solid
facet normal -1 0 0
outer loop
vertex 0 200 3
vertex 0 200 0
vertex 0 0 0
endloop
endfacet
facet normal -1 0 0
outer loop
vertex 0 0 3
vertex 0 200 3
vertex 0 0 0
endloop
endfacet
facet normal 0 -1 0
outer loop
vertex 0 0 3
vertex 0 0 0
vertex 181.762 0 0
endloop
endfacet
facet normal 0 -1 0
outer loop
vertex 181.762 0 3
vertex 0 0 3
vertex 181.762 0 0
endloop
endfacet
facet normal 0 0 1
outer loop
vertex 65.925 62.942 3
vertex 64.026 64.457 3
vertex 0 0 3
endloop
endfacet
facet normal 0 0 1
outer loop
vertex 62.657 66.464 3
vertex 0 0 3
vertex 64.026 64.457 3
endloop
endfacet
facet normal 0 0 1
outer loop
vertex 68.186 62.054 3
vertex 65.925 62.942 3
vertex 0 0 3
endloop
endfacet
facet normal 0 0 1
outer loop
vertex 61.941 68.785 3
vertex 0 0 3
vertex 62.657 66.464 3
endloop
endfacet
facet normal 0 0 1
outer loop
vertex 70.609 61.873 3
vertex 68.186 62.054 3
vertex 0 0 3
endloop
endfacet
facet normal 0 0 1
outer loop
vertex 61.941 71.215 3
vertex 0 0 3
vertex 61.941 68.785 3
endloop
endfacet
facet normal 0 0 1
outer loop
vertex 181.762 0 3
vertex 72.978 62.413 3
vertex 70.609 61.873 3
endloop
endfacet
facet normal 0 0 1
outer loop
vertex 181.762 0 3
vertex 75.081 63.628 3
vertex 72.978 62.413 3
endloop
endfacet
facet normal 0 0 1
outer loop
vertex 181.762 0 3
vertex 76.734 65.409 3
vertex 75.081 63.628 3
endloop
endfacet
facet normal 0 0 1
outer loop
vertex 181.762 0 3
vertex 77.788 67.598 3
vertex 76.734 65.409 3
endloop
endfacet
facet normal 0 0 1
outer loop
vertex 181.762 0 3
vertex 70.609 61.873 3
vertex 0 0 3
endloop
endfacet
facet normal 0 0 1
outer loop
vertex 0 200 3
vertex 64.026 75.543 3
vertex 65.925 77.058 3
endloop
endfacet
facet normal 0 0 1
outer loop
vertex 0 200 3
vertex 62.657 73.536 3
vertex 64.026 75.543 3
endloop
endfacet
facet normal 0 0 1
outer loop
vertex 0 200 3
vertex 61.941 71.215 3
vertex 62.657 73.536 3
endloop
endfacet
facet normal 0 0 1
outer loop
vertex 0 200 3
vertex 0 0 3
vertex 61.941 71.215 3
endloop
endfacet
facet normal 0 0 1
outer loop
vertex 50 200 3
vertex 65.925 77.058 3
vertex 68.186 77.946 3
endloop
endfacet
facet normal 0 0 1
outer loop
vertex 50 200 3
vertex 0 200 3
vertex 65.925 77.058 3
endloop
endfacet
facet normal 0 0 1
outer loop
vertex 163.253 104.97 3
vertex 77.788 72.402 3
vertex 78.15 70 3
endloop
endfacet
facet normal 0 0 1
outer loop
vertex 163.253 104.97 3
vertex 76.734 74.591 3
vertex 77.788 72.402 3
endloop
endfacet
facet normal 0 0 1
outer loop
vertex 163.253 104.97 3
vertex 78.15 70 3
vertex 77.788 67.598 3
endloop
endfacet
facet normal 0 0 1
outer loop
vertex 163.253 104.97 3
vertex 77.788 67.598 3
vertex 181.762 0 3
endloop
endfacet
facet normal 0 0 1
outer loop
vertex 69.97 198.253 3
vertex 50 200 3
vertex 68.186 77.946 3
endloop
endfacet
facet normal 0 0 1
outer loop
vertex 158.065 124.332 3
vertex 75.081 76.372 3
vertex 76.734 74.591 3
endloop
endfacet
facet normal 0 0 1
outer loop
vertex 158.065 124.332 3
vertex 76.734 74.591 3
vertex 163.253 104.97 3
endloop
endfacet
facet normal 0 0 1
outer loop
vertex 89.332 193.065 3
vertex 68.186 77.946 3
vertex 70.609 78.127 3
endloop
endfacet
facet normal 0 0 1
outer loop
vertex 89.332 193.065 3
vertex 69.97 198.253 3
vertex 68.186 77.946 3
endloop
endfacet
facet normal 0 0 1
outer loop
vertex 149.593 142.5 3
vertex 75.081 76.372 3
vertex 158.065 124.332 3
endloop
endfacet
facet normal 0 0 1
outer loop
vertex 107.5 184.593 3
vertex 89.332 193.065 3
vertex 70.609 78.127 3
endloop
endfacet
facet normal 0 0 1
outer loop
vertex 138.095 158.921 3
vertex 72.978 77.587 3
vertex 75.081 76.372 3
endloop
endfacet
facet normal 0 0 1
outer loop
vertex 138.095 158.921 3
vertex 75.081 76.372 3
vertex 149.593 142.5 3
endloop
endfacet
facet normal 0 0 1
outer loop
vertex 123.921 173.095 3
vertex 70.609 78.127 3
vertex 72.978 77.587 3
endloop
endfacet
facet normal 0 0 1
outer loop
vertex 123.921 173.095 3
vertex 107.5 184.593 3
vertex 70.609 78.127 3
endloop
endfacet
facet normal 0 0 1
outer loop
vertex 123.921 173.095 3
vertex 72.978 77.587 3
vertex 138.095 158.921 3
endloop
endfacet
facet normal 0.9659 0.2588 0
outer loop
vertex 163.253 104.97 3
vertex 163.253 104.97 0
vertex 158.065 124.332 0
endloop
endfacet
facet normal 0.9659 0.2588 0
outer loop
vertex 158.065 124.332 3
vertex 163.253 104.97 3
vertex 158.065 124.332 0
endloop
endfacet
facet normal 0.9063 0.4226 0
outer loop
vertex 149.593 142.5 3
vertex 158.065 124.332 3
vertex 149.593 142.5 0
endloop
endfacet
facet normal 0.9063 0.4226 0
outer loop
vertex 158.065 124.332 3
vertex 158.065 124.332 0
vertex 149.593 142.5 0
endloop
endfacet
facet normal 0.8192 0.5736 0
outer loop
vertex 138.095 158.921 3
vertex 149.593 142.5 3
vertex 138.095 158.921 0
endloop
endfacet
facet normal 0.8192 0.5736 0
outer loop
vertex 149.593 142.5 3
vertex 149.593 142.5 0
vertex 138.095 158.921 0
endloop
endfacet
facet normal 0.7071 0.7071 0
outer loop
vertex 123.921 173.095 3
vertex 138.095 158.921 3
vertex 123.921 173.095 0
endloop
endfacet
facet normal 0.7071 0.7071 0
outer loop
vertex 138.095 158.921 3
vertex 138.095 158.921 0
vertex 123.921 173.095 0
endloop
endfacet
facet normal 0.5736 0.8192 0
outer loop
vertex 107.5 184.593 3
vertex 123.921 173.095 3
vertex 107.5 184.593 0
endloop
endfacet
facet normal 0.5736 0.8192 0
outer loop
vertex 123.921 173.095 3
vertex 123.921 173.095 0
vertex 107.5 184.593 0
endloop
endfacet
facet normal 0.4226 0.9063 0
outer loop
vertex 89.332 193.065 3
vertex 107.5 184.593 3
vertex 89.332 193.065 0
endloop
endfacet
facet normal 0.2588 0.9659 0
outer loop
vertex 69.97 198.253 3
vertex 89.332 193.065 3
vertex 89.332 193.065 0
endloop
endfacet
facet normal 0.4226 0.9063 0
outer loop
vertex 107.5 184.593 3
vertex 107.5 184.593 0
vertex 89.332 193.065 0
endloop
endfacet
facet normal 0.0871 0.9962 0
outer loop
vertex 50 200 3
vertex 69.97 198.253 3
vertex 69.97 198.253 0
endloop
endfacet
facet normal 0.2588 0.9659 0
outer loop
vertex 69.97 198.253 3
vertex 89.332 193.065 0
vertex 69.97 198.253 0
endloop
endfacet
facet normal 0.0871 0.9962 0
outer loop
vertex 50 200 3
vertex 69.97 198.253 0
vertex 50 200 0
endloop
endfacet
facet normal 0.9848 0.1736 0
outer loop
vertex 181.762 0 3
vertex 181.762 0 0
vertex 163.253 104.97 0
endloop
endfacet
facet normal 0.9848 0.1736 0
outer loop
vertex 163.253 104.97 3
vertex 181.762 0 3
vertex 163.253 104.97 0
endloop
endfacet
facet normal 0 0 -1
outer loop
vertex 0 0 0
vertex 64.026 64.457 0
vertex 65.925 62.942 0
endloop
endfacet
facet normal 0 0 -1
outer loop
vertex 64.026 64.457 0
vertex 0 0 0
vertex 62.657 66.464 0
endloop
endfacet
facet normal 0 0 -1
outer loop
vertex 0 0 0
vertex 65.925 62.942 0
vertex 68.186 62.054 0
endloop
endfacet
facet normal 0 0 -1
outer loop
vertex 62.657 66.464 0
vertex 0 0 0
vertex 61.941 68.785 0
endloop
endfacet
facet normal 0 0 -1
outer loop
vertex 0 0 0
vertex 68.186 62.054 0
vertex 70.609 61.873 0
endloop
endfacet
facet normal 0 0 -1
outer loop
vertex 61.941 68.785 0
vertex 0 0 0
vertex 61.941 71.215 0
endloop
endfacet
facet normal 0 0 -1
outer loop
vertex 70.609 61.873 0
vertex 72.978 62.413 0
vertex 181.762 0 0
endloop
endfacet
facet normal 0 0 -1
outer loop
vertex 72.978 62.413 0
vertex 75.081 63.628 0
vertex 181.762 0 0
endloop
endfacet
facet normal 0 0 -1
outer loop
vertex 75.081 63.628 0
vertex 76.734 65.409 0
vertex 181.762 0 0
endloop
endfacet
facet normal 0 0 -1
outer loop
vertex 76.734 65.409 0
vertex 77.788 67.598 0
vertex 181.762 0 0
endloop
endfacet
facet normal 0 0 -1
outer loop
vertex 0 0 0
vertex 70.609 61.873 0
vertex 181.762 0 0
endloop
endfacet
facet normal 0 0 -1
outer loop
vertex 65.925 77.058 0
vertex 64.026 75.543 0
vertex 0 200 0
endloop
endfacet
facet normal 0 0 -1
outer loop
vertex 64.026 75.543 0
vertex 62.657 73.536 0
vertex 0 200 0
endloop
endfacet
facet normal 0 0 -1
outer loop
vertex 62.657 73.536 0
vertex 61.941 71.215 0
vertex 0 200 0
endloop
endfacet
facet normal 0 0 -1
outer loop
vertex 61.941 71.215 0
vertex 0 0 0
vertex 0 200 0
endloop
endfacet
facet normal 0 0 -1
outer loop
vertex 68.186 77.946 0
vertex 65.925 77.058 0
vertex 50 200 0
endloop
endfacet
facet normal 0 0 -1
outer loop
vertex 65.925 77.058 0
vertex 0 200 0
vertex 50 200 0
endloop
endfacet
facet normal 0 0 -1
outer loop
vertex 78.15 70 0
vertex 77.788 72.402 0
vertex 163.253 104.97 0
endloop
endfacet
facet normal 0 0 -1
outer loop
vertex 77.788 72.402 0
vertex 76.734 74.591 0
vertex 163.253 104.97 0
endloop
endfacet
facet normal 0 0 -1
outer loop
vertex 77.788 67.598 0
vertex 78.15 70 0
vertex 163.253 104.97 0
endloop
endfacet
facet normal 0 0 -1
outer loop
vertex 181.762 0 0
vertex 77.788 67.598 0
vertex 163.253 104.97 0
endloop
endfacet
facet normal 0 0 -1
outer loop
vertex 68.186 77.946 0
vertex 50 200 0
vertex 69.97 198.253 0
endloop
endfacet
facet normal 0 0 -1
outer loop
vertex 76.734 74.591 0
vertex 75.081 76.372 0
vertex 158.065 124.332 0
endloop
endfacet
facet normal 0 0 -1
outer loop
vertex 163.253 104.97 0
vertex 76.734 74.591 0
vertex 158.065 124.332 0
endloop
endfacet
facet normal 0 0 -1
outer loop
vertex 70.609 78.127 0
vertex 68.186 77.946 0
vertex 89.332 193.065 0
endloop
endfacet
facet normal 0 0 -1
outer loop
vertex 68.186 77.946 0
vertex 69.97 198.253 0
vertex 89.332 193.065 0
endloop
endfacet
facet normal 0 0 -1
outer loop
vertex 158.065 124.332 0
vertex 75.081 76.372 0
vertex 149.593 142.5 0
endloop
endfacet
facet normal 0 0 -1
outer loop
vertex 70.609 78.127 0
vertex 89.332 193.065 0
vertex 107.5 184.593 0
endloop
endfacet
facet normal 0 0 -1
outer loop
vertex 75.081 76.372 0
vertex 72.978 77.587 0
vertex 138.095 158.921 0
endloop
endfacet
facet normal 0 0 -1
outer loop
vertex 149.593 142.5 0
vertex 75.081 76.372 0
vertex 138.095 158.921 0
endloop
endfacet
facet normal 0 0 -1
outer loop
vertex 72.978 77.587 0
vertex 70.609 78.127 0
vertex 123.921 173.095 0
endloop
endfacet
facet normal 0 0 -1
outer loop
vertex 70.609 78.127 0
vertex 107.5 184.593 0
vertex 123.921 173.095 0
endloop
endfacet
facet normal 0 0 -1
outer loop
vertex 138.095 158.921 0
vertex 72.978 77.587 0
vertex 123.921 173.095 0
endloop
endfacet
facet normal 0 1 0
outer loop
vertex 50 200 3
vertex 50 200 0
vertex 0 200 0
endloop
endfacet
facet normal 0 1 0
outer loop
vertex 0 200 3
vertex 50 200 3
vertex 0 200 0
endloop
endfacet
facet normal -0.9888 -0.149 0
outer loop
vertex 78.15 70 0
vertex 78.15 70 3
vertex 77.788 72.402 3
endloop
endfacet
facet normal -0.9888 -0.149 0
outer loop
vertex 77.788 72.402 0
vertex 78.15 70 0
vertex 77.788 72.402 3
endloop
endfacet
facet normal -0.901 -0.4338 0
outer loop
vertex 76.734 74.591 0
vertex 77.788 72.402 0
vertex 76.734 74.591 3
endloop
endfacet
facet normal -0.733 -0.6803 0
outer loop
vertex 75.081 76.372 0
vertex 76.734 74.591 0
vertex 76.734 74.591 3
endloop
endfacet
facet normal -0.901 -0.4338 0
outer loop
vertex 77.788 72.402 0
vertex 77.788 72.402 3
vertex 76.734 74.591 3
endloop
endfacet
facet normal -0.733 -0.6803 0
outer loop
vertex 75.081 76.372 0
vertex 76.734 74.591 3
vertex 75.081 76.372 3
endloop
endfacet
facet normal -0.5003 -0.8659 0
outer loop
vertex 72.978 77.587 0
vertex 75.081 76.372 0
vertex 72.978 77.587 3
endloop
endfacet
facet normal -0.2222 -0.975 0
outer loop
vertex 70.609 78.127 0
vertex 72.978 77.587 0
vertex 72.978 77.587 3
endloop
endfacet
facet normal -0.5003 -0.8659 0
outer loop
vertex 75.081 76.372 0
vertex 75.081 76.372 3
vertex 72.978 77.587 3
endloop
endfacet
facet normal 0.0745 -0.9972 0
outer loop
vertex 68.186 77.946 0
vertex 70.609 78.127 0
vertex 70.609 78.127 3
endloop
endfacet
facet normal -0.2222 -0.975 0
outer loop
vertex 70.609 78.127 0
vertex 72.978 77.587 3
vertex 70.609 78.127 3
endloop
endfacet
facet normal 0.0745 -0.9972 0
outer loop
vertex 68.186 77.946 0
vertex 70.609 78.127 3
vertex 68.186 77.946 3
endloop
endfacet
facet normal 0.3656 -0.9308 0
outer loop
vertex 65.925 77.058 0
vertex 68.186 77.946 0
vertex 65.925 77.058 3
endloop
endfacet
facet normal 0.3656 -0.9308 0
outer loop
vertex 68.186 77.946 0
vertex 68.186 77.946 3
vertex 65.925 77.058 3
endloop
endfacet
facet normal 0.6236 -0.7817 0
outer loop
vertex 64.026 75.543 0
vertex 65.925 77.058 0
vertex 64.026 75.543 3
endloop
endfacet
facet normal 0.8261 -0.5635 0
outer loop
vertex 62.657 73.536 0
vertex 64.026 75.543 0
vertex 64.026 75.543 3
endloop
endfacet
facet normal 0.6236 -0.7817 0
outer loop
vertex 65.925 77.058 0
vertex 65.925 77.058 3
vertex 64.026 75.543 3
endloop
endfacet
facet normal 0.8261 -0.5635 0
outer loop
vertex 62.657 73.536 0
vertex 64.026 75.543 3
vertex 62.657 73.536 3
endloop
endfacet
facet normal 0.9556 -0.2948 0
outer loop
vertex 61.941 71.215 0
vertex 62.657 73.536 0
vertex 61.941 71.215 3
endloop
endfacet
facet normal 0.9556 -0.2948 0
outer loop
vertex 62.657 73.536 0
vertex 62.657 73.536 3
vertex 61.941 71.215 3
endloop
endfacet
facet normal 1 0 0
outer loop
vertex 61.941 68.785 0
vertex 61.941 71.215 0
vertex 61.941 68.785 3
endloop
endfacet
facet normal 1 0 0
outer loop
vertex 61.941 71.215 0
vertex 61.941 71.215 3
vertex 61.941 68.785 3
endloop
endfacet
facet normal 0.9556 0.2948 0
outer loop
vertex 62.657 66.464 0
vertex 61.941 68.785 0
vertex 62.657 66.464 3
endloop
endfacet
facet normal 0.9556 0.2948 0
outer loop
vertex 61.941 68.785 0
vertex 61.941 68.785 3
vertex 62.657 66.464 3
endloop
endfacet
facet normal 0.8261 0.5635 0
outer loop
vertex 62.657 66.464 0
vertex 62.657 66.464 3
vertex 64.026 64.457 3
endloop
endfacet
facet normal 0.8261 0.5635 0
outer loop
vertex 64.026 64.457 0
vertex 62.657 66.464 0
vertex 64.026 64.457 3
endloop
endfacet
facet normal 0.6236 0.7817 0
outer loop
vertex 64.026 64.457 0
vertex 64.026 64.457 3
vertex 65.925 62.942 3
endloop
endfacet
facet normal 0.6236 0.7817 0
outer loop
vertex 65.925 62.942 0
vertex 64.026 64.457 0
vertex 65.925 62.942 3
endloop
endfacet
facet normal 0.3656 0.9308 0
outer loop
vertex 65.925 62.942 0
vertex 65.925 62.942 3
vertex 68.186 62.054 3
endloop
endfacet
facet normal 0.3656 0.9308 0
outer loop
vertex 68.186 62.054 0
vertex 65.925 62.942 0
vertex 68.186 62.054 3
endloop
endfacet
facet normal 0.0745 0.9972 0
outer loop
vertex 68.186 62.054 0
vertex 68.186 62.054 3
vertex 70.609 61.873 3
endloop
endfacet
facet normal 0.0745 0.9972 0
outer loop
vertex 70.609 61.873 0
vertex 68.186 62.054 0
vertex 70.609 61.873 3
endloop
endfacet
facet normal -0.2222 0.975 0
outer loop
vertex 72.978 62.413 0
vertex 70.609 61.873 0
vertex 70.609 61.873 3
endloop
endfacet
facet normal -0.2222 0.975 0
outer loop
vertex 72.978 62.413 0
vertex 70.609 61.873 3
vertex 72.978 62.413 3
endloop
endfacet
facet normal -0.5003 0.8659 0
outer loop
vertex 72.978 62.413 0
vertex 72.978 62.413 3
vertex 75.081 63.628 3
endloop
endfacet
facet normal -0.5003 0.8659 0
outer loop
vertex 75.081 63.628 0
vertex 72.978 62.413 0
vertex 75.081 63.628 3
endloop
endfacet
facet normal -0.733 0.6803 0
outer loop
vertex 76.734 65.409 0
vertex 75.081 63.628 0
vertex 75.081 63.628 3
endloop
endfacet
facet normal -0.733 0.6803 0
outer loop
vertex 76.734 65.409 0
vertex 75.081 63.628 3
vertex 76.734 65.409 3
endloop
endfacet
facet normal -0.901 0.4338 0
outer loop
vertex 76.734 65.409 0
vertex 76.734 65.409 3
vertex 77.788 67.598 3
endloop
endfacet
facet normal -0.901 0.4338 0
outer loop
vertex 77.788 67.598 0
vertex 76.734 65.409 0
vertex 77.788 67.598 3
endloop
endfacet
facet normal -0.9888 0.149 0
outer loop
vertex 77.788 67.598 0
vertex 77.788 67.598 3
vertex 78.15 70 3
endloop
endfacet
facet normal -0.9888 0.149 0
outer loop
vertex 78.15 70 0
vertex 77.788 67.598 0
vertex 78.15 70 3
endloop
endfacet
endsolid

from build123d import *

# Parameters (mm, degrees)
F1_DEPTH = 3
F2_R     = 8.15
F3_DEPTH = 25


with BuildPart() as f1:
    # F0 (on Top) → F1 (new body)
    with BuildSketch(Plane.XY):
        with BuildLine():
            Line((0, 200), (0, 0))
            Line((0, 0), (181.761854, 0))
            Line((181.761854, 0), (163.252892, 104.96954))
            ThreePointArc((163.252892, 104.96954), (123.920575, 173.095111), (50, 200))
            Line((50, 200), (0, 200))
        make_face()
    extrude(amount=F1_DEPTH)

    # F2 (on face) → F3 (cut)
    with BuildSketch(Plane.XY.offset(3)):
        with Locations((70, 70)):
            Circle(F2_R)
    extrude(amount=-F3_DEPTH, mode=Mode.SUBTRACT)


solid = f1.part
